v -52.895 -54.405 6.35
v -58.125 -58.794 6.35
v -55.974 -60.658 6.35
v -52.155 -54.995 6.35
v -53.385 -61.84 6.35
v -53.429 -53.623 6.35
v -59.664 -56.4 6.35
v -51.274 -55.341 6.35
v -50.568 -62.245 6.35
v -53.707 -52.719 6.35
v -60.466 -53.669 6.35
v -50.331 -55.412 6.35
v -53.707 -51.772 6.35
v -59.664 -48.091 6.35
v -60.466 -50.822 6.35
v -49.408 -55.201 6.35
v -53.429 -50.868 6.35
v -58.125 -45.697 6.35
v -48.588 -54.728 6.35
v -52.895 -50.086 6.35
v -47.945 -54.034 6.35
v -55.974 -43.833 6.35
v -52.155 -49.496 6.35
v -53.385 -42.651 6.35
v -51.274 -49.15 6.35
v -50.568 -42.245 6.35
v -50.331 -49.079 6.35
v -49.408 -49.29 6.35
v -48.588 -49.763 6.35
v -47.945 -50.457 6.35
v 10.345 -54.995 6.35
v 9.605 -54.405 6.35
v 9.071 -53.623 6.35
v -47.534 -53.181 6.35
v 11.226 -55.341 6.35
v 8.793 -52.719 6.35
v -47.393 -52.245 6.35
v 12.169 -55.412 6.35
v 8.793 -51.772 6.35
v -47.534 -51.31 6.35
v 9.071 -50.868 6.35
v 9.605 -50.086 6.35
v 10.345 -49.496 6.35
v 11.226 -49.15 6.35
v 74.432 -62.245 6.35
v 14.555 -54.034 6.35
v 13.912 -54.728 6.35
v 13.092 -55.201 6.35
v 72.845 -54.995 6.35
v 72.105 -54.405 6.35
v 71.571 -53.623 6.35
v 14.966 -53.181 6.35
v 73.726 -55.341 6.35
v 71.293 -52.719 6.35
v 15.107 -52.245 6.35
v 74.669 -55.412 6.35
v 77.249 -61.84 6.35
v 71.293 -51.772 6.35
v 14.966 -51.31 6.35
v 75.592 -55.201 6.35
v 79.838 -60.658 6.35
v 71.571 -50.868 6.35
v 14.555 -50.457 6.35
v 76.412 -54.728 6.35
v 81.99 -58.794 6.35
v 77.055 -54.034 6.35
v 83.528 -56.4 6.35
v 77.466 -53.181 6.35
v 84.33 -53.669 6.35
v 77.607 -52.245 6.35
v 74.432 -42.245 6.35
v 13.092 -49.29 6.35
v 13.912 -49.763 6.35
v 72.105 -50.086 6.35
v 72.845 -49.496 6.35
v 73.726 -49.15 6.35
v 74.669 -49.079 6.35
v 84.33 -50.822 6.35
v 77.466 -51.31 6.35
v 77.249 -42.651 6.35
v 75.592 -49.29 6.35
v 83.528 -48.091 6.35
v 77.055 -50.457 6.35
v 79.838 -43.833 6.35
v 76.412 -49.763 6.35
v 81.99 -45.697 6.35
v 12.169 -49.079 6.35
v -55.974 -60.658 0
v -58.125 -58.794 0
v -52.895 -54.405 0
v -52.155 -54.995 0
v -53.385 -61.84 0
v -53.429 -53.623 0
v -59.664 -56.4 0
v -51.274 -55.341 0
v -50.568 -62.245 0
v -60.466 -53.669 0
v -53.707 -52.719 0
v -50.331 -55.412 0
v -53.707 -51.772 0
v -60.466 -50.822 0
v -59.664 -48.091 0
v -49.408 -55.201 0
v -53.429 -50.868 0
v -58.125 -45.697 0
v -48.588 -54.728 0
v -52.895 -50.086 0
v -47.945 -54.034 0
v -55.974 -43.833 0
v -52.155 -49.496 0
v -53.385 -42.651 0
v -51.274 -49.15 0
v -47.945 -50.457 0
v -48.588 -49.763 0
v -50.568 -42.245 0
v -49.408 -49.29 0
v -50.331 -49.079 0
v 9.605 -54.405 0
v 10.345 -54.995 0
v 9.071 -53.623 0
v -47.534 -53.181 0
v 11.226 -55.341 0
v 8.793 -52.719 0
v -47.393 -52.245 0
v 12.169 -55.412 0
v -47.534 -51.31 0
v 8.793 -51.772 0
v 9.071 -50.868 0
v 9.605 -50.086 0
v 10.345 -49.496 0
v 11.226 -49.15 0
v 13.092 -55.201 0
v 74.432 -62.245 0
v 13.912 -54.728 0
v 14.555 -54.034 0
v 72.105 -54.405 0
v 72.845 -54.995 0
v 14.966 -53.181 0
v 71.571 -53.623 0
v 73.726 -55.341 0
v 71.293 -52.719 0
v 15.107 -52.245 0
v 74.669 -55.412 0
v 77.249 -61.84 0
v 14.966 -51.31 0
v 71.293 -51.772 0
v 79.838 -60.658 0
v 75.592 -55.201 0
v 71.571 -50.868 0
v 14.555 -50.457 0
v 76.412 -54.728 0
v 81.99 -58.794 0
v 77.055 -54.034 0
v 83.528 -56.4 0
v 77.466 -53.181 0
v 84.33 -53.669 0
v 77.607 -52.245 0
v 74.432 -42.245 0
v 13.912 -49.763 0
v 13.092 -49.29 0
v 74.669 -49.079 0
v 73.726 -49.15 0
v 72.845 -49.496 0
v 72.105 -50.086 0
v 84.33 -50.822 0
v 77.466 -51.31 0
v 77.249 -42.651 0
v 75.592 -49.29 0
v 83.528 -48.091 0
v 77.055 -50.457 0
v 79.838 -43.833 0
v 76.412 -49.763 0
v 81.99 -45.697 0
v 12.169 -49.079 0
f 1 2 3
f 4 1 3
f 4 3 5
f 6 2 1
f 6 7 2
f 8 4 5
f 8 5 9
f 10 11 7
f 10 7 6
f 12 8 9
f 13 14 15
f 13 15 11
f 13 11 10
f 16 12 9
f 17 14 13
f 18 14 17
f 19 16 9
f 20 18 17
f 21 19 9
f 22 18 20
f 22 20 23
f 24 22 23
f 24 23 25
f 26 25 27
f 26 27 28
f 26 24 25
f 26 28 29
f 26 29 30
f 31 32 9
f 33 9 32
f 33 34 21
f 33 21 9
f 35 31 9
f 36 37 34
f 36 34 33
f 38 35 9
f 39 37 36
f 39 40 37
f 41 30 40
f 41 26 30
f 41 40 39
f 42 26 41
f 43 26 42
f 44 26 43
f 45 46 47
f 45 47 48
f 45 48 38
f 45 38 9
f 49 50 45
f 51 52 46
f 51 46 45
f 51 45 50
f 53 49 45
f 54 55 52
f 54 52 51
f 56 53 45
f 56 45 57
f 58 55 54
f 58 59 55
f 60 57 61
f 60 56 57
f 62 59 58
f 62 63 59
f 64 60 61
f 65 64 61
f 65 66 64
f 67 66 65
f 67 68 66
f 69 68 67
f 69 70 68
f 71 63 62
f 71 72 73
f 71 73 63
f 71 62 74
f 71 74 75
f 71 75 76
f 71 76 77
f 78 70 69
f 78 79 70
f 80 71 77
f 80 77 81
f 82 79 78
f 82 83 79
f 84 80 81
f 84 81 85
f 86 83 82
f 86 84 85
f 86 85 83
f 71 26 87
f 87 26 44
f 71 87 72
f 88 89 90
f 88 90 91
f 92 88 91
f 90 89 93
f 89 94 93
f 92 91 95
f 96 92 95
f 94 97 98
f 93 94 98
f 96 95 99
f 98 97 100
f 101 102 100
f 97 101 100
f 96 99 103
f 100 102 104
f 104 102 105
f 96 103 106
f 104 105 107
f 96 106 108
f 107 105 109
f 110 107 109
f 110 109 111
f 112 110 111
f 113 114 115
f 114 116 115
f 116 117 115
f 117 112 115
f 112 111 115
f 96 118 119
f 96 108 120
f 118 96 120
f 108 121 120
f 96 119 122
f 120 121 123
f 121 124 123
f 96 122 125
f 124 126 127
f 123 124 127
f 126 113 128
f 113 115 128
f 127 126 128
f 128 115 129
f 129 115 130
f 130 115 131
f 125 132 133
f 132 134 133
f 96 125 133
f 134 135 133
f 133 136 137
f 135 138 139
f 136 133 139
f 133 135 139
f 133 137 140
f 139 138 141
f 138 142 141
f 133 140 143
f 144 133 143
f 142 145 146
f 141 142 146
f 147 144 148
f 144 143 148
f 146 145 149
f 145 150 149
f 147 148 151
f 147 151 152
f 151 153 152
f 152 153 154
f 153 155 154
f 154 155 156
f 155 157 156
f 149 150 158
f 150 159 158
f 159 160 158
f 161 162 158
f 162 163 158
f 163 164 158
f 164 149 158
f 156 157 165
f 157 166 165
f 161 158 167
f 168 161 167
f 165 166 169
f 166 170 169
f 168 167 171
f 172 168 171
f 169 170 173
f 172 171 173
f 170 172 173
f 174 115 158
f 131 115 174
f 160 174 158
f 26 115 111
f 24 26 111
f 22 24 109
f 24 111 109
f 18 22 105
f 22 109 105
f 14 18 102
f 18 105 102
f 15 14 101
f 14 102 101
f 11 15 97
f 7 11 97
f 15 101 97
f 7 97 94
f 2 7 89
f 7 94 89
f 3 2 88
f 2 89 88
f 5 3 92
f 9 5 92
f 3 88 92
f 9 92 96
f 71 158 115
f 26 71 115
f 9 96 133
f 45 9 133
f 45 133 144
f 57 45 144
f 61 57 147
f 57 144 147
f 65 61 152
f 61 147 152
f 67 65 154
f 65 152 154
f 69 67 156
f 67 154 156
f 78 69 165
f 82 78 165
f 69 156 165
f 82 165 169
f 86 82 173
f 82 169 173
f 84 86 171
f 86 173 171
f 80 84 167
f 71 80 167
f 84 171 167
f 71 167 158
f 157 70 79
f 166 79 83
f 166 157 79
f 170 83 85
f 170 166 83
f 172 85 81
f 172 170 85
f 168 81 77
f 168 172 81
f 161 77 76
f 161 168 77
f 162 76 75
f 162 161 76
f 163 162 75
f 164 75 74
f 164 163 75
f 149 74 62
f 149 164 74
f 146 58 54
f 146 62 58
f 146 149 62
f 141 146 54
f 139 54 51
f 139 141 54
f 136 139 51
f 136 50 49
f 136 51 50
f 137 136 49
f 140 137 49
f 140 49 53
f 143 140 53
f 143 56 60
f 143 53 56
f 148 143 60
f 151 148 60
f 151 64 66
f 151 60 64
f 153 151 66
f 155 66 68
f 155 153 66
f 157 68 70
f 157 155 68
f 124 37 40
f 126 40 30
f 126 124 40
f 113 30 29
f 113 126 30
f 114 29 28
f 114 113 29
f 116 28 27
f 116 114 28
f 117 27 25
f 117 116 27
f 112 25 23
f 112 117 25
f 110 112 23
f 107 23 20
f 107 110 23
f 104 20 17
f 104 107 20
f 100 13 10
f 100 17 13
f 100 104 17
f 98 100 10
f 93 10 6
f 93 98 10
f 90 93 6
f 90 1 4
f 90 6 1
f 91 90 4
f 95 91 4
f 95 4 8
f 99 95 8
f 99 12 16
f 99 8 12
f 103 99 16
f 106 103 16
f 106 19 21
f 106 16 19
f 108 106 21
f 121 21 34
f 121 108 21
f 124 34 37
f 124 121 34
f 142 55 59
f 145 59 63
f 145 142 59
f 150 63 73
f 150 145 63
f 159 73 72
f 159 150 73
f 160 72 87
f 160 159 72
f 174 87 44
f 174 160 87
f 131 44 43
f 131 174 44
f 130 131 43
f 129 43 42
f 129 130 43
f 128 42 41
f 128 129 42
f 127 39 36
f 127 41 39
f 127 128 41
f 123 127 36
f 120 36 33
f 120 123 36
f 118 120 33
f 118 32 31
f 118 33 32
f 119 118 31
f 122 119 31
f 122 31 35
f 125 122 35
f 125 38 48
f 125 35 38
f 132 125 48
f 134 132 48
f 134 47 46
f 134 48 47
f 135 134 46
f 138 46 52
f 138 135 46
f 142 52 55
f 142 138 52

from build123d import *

# Parameters (mm, degrees)
F2_DEPTH = 6.35
F1_R     = 3.175
F3_DEPTH = 6.351


with BuildPart() as f2:
    # F0 (on Top) → F2 (new body)
    with BuildSketch(Plane.XY):
        with BuildLine():
            Line((74.432049, -42.245469), (-50.567951, -42.245469))
            ThreePointArc((-50.567951, -42.245469), (-60.567951, -52.245469), (-50.567951, -62.245469))
            Line((-50.567951, -62.245469), (74.432049, -62.245469))
            ThreePointArc((74.432049, -62.245469), (84.432049, -52.245469), (74.432049, -42.245469))
        make_face()
    extrude(amount=F2_DEPTH)

    # F1 (on Top) → F3 (cut, through all)
    with BuildSketch(Plane.XY):
        with Locations((-50.567951, -52.245469)):
            Circle(F1_R)
        with Locations((74.432049, -52.245469)):
            Circle(F1_R)
        with Locations((11.932049, -52.245469)):
            Circle(F1_R)
    extrude(amount=F3_DEPTH, mode=Mode.SUBTRACT)


solid = f2.part
